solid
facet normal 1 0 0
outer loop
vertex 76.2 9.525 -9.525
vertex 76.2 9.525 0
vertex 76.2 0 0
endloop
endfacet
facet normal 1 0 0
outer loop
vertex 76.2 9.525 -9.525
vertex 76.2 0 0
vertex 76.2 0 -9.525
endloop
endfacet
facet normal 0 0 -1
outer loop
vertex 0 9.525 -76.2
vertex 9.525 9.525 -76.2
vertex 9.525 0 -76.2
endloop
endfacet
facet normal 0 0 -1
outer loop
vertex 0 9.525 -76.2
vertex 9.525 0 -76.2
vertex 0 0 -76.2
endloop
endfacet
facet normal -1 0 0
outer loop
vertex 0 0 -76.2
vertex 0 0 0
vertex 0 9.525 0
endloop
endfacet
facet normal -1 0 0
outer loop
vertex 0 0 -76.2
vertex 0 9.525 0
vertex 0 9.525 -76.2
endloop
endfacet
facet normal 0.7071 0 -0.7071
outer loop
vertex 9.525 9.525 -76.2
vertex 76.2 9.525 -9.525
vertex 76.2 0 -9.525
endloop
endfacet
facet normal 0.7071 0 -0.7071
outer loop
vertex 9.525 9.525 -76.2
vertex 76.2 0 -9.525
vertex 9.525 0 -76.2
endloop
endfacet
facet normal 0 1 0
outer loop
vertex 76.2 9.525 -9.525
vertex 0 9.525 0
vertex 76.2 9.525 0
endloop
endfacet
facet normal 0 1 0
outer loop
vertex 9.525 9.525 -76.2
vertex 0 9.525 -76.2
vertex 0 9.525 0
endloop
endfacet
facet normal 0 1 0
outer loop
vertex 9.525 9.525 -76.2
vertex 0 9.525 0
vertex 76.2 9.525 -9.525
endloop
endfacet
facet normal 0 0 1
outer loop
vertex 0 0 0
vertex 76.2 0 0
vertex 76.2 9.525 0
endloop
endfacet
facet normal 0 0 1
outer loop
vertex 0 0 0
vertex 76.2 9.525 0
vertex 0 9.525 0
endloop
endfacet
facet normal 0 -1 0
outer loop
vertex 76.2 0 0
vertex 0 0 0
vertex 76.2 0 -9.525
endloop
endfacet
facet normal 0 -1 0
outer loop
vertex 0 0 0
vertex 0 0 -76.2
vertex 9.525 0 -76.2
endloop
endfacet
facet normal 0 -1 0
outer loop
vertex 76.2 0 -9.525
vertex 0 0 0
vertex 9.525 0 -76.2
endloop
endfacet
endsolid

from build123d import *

# Parameters (mm, degrees)
SALIENTE_EXTRUIR1_DEPTH = 9.525
SALIENTE_EXTRUIR2_DEPTH = 9.525


with BuildPart() as part:
    # Croquis1 → Saliente-Extruir1 (new body)
    with BuildSketch(Plane(origin=(0, 0, 0), x_dir=(1, 0, 0), z_dir=(0, 1, 0))):
        Polygon((0, 0), (0, 76.2), (76.2, 0), align=None)
    extrude(amount=SALIENTE_EXTRUIR1_DEPTH)

    # Croquis2 → Saliente-Extruir2 (add)
    with BuildSketch(Plane(origin=(0, 9.525, 0), x_dir=(1, 0, 0), z_dir=(0, 1, 0))):
        Polygon((76.2, 0), (76.2, 9.525), (9.525, 76.2), (0, 76.2), align=None)
    extrude(amount=-SALIENTE_EXTRUIR2_DEPTH)


solid = part.part
